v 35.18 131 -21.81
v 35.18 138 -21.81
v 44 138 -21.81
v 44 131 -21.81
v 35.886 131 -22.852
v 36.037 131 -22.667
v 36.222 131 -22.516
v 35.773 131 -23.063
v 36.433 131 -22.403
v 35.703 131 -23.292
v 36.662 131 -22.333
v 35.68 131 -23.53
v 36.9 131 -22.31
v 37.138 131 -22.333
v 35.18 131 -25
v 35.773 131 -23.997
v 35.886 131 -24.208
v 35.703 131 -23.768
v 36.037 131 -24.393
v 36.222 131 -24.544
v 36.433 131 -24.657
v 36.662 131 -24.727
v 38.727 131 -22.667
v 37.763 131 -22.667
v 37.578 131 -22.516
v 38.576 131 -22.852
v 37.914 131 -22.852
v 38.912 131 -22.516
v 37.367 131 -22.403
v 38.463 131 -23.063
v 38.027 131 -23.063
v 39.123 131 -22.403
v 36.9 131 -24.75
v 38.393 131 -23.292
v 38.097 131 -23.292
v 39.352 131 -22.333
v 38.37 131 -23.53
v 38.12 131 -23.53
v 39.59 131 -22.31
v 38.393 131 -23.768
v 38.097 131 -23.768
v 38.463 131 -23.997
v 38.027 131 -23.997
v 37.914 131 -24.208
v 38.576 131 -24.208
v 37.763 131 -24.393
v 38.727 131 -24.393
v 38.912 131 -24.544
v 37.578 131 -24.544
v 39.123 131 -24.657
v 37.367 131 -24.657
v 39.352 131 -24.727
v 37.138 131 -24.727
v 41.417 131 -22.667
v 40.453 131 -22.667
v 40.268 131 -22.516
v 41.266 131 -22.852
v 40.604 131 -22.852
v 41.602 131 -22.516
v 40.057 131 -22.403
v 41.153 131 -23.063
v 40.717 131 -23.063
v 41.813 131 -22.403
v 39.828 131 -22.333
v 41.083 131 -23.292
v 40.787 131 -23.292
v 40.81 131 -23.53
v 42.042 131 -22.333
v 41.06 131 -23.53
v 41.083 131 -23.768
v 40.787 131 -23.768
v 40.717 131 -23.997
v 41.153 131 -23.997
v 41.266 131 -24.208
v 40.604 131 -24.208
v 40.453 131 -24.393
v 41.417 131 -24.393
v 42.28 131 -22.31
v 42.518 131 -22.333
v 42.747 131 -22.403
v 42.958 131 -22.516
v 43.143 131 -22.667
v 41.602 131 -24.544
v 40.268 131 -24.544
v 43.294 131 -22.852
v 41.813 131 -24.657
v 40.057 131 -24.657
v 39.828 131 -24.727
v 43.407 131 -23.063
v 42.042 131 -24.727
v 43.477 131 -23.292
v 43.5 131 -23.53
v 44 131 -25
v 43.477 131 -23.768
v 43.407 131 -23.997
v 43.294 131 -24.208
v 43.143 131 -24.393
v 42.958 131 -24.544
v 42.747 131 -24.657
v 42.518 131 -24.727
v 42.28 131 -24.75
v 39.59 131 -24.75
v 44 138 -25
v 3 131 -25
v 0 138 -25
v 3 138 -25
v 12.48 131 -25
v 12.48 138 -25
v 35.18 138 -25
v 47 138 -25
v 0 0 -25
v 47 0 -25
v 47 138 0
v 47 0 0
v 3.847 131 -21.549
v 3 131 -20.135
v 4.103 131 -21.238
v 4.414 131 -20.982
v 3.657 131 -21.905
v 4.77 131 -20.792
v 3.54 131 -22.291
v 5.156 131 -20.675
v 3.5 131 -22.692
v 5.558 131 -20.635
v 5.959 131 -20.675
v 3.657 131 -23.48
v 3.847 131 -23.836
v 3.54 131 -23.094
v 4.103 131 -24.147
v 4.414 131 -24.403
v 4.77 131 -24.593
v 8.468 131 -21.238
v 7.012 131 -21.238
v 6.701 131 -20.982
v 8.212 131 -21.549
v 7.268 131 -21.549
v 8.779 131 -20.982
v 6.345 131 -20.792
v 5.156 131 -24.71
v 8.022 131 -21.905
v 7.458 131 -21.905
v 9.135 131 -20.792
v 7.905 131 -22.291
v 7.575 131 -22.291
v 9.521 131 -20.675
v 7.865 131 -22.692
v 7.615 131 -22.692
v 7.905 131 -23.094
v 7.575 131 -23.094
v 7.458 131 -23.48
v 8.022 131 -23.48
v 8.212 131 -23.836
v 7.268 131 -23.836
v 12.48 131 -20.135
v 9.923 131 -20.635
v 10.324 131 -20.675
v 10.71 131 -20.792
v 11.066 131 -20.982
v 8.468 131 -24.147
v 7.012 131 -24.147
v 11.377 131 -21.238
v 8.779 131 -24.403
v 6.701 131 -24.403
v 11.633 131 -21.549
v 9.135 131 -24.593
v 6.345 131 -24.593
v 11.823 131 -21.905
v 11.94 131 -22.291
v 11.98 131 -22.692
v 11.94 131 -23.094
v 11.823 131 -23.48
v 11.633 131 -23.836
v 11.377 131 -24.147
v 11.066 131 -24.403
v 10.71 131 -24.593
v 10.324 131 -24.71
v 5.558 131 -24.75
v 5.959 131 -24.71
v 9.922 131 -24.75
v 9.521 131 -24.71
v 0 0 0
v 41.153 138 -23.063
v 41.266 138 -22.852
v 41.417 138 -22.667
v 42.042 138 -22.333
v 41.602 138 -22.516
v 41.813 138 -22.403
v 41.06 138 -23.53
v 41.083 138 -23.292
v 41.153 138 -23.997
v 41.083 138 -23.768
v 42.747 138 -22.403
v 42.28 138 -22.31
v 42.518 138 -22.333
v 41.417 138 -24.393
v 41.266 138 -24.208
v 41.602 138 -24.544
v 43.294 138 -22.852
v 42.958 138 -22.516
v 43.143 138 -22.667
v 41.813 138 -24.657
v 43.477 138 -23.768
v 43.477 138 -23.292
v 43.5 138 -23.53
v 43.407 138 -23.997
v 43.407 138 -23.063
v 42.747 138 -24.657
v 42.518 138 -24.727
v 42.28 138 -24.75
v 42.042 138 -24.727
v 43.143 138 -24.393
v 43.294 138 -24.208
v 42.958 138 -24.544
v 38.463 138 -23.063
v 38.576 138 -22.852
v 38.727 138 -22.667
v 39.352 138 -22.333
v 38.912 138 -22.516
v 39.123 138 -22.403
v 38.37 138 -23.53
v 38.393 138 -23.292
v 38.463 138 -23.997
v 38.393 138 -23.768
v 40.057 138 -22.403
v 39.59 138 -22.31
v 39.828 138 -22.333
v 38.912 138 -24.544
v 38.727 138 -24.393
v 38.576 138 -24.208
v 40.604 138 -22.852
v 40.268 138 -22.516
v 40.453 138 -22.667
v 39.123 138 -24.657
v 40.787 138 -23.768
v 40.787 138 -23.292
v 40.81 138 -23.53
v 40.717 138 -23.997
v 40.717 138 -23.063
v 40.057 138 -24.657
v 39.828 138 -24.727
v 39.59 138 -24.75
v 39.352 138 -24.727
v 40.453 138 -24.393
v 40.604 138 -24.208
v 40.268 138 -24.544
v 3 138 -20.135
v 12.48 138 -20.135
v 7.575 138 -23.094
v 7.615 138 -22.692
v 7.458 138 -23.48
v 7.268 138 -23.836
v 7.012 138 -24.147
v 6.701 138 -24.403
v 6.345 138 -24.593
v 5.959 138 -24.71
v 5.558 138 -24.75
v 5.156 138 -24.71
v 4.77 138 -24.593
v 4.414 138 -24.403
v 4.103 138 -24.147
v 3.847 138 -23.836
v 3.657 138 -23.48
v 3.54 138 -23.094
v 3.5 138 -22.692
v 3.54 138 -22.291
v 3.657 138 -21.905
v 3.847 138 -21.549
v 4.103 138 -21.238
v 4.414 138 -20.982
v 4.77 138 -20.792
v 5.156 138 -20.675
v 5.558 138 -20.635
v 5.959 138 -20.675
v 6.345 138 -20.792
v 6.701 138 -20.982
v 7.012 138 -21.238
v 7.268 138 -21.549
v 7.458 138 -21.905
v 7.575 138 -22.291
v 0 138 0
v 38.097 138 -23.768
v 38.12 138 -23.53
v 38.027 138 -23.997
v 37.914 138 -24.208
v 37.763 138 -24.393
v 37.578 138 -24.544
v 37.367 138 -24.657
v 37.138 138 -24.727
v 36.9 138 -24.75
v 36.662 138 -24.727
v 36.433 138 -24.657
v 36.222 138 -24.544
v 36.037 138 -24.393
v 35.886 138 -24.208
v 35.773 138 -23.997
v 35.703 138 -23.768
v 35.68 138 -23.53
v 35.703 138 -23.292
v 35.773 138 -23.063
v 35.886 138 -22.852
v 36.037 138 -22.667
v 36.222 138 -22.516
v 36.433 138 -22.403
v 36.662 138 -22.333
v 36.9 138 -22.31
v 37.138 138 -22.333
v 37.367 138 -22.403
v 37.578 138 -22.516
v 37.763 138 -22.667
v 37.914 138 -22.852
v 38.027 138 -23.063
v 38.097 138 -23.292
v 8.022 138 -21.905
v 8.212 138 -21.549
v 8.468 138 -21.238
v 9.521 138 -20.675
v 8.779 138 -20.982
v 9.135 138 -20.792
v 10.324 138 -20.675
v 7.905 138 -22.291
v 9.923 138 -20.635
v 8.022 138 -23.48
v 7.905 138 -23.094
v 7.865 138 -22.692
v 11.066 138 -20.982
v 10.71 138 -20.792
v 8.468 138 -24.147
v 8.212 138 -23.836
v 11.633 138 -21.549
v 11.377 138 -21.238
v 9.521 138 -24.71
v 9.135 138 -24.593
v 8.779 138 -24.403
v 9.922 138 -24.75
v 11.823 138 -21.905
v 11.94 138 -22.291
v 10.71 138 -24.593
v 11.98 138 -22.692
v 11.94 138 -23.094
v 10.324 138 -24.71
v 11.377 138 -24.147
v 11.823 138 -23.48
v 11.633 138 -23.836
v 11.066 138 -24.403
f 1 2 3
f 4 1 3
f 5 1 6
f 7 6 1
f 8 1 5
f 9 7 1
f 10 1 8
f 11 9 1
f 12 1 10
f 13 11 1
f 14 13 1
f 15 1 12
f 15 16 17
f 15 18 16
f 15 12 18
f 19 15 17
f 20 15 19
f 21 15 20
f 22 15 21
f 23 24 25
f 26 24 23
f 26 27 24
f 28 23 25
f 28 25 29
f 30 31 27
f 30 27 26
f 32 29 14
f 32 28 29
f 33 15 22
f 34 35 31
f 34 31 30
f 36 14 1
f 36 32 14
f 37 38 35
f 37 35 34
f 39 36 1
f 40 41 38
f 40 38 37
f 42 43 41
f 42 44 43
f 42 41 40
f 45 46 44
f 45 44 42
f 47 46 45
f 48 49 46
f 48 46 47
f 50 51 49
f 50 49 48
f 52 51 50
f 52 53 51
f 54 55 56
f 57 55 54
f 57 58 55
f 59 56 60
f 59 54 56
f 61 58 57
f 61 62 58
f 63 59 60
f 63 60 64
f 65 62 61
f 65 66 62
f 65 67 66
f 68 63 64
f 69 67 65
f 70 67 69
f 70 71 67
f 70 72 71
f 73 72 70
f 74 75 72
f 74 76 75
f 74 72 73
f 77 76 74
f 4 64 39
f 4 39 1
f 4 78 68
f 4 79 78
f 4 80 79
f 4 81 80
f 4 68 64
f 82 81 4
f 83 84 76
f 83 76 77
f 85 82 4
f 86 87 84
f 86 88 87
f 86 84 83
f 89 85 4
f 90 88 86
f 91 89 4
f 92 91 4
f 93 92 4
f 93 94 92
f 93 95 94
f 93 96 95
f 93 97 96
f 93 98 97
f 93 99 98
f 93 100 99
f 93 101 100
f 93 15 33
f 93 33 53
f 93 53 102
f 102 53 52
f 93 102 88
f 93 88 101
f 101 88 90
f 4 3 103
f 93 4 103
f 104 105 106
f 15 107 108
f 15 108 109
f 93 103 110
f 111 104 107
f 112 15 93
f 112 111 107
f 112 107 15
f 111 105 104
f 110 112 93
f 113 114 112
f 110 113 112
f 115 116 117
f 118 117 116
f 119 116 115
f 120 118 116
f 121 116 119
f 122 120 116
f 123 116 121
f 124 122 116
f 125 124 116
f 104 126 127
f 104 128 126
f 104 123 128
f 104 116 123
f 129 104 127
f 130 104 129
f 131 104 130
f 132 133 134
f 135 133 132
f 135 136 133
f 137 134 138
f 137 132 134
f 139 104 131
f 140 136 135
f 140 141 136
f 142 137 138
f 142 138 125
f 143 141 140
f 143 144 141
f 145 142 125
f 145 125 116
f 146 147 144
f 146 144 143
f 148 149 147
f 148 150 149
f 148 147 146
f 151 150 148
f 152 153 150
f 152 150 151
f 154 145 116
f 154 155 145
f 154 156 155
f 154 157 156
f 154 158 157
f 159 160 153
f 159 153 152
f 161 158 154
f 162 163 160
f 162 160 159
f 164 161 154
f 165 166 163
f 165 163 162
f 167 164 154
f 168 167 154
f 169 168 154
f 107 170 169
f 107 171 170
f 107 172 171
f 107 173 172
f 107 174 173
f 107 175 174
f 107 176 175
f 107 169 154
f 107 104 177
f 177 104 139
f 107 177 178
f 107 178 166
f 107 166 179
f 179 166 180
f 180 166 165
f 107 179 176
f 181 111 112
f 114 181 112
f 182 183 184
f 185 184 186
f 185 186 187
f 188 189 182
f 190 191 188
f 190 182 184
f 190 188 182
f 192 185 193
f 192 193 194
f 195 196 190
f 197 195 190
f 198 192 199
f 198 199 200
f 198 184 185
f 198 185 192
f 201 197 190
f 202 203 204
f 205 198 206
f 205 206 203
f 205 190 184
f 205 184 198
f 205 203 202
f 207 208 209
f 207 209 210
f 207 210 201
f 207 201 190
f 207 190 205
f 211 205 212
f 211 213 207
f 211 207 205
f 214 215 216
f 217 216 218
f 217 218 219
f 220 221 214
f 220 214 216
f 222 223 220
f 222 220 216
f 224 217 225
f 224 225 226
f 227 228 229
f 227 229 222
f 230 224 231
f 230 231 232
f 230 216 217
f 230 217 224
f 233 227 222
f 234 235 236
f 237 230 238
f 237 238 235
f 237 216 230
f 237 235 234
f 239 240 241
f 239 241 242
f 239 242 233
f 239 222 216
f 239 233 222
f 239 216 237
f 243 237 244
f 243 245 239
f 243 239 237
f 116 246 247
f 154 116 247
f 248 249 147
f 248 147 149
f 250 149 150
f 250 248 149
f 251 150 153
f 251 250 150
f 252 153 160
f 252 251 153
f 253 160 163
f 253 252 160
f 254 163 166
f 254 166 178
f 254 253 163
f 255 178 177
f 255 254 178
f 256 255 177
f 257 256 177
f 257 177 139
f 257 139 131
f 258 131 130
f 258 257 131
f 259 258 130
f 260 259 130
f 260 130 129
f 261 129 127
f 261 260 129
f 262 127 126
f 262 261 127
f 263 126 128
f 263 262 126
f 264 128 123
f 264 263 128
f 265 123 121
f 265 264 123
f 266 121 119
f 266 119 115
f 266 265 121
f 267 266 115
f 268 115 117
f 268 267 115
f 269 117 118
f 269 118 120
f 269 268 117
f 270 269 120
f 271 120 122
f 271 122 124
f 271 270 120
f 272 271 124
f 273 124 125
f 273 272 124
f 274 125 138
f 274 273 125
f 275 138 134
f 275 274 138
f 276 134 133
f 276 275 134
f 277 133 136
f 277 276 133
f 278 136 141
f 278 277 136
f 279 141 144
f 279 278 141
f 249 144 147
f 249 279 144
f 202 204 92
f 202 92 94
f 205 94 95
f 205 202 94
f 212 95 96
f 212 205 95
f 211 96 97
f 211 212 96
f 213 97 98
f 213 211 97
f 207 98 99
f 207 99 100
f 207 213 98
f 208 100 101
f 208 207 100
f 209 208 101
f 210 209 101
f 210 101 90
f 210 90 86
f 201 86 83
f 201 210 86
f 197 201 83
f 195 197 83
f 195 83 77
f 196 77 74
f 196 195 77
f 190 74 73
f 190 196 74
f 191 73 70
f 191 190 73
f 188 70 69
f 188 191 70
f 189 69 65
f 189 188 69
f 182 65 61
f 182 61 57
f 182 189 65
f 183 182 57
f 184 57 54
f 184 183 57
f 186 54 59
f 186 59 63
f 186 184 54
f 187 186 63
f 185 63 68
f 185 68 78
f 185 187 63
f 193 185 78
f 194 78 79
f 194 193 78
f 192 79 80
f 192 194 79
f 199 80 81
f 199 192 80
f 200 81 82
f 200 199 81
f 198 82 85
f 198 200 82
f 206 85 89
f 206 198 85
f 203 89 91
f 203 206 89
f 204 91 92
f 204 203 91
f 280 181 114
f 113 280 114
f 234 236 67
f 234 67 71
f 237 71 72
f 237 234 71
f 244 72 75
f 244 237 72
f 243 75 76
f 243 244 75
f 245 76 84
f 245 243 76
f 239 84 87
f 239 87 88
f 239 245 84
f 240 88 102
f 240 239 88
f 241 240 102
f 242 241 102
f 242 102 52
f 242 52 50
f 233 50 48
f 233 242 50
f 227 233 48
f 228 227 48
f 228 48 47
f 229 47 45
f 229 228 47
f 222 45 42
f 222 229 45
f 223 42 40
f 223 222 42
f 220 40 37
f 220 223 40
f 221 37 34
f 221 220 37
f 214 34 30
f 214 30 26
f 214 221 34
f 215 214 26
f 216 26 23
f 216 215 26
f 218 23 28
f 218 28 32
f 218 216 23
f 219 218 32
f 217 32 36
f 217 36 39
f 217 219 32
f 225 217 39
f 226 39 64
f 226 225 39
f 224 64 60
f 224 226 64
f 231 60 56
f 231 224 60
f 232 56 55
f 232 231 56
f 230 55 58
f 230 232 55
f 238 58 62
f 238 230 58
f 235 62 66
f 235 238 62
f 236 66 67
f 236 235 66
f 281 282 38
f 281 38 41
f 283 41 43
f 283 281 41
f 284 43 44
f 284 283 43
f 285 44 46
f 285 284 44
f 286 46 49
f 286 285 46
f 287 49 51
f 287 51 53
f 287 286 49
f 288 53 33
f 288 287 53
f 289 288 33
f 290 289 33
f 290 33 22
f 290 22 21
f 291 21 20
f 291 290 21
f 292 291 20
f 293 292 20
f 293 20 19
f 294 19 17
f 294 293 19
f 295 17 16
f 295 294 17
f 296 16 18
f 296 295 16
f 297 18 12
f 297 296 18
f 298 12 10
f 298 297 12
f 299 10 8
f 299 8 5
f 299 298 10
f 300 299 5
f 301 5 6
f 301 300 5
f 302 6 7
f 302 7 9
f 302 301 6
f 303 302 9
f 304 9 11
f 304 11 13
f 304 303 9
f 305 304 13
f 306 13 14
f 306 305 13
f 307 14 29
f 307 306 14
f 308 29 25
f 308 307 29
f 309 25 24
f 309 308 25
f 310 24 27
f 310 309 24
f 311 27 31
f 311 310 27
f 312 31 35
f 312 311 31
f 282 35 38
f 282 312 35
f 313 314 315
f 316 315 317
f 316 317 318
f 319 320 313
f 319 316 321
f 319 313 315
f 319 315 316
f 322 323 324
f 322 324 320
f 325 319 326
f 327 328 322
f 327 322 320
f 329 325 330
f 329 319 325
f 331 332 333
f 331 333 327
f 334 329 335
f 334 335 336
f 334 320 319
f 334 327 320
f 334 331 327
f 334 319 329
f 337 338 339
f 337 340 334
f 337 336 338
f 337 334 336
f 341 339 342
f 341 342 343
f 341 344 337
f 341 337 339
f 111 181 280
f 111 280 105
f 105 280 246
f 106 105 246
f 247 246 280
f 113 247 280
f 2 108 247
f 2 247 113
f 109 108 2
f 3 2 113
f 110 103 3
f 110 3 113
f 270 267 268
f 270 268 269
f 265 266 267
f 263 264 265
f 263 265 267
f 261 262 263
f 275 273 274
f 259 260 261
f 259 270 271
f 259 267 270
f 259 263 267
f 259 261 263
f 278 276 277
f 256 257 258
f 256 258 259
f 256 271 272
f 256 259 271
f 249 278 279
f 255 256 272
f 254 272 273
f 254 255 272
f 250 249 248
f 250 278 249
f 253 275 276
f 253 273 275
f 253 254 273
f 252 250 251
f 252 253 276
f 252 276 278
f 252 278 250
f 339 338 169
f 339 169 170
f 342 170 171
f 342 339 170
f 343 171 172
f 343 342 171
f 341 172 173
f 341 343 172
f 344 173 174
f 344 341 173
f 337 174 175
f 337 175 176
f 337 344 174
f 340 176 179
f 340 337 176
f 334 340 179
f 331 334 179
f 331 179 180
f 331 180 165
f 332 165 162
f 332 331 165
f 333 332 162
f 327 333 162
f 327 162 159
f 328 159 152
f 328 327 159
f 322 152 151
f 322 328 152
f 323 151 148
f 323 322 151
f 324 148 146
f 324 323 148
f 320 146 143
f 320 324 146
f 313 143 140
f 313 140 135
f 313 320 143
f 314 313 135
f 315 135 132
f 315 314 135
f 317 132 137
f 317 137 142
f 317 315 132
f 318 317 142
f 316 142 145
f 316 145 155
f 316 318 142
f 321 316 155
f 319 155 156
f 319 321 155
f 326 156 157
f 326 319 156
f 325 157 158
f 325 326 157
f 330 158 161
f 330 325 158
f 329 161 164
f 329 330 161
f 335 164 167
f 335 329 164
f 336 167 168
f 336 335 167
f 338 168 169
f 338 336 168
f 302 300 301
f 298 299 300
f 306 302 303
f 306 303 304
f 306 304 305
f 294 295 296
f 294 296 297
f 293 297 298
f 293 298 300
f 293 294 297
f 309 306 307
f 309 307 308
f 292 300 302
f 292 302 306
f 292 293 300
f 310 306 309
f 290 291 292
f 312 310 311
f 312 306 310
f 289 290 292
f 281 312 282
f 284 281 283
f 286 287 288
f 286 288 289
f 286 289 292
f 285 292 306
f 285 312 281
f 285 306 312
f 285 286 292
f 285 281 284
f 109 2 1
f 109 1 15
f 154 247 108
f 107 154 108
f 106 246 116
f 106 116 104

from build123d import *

# Parameters (mm, degrees)
SKETCH1_W           = 47
SKETCH1_H           = 25
BOSS_EXTRUDE1_DEPTH = 138
SKETCH2_W           = 9.48
SKETCH2_H           = 4.865
SKETCH2_R           = 2.0575
SKETCH2_W_2         = 8.82
SKETCH2_H_2         = 3.19
SKETCH2_R_2         = 1.22
CUT_EXTRUDE1_DEPTH  = 7


with BuildPart() as part:
    # Sketch1 → Boss-Extrude1 (new body)
    with BuildSketch(Plane(origin=(0, 0, 0), x_dir=(1, 0, 0), z_dir=(0, 1, 0))):
        with Locations((23.5, 12.5)):
            Rectangle(SKETCH1_W, SKETCH1_H)
    extrude(amount=BOSS_EXTRUDE1_DEPTH)

    # Sketch2 → Cut-Extrude1 (cut)
    with BuildSketch(Plane(origin=(0, 138, 0), x_dir=(1, 0, 0), z_dir=(0, 1, 0))):
        with Locations((7.74, 22.5675)):
            Rectangle(SKETCH2_W, SKETCH2_H)
        with Locations((5.5575, 22.6925)):
            Circle(SKETCH2_R, mode=Mode.SUBTRACT)
        with Locations((9.9225, 22.6925)):
            Circle(SKETCH2_R, mode=Mode.SUBTRACT)
        with Locations((39.59, 23.405)):
            Rectangle(SKETCH2_W_2, SKETCH2_H_2)
        with Locations((36.9, 23.53)):
            Circle(SKETCH2_R_2, mode=Mode.SUBTRACT)
        with Locations((39.59, 23.53)):
            Circle(SKETCH2_R_2, mode=Mode.SUBTRACT)
        with Locations((42.28, 23.53)):
            Circle(SKETCH2_R_2, mode=Mode.SUBTRACT)
    extrude(amount=-CUT_EXTRUDE1_DEPTH, mode=Mode.SUBTRACT)


solid = part.part
